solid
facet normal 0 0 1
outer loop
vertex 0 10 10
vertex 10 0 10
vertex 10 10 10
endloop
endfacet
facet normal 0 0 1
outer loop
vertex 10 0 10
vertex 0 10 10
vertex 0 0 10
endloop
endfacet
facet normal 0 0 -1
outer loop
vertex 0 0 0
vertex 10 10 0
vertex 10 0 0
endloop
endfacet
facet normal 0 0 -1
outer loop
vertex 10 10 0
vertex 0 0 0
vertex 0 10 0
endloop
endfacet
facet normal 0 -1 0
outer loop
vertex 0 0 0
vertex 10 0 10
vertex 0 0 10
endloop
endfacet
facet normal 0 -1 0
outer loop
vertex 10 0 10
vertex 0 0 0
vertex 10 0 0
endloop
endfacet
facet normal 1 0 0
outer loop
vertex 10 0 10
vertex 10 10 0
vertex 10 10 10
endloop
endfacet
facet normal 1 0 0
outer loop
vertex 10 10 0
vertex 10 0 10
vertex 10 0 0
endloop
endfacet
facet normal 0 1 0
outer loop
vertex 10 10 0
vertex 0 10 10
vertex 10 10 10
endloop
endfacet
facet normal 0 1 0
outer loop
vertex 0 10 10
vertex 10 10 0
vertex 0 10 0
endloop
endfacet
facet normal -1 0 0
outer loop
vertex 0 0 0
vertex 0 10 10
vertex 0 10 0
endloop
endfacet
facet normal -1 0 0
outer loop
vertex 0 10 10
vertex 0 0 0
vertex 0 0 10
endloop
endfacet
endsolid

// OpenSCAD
module chairBracket(width, length, wall)
{
    union()
    {
        cube([ 10, 10, 10 ]);
    }
}

chairBracket();
